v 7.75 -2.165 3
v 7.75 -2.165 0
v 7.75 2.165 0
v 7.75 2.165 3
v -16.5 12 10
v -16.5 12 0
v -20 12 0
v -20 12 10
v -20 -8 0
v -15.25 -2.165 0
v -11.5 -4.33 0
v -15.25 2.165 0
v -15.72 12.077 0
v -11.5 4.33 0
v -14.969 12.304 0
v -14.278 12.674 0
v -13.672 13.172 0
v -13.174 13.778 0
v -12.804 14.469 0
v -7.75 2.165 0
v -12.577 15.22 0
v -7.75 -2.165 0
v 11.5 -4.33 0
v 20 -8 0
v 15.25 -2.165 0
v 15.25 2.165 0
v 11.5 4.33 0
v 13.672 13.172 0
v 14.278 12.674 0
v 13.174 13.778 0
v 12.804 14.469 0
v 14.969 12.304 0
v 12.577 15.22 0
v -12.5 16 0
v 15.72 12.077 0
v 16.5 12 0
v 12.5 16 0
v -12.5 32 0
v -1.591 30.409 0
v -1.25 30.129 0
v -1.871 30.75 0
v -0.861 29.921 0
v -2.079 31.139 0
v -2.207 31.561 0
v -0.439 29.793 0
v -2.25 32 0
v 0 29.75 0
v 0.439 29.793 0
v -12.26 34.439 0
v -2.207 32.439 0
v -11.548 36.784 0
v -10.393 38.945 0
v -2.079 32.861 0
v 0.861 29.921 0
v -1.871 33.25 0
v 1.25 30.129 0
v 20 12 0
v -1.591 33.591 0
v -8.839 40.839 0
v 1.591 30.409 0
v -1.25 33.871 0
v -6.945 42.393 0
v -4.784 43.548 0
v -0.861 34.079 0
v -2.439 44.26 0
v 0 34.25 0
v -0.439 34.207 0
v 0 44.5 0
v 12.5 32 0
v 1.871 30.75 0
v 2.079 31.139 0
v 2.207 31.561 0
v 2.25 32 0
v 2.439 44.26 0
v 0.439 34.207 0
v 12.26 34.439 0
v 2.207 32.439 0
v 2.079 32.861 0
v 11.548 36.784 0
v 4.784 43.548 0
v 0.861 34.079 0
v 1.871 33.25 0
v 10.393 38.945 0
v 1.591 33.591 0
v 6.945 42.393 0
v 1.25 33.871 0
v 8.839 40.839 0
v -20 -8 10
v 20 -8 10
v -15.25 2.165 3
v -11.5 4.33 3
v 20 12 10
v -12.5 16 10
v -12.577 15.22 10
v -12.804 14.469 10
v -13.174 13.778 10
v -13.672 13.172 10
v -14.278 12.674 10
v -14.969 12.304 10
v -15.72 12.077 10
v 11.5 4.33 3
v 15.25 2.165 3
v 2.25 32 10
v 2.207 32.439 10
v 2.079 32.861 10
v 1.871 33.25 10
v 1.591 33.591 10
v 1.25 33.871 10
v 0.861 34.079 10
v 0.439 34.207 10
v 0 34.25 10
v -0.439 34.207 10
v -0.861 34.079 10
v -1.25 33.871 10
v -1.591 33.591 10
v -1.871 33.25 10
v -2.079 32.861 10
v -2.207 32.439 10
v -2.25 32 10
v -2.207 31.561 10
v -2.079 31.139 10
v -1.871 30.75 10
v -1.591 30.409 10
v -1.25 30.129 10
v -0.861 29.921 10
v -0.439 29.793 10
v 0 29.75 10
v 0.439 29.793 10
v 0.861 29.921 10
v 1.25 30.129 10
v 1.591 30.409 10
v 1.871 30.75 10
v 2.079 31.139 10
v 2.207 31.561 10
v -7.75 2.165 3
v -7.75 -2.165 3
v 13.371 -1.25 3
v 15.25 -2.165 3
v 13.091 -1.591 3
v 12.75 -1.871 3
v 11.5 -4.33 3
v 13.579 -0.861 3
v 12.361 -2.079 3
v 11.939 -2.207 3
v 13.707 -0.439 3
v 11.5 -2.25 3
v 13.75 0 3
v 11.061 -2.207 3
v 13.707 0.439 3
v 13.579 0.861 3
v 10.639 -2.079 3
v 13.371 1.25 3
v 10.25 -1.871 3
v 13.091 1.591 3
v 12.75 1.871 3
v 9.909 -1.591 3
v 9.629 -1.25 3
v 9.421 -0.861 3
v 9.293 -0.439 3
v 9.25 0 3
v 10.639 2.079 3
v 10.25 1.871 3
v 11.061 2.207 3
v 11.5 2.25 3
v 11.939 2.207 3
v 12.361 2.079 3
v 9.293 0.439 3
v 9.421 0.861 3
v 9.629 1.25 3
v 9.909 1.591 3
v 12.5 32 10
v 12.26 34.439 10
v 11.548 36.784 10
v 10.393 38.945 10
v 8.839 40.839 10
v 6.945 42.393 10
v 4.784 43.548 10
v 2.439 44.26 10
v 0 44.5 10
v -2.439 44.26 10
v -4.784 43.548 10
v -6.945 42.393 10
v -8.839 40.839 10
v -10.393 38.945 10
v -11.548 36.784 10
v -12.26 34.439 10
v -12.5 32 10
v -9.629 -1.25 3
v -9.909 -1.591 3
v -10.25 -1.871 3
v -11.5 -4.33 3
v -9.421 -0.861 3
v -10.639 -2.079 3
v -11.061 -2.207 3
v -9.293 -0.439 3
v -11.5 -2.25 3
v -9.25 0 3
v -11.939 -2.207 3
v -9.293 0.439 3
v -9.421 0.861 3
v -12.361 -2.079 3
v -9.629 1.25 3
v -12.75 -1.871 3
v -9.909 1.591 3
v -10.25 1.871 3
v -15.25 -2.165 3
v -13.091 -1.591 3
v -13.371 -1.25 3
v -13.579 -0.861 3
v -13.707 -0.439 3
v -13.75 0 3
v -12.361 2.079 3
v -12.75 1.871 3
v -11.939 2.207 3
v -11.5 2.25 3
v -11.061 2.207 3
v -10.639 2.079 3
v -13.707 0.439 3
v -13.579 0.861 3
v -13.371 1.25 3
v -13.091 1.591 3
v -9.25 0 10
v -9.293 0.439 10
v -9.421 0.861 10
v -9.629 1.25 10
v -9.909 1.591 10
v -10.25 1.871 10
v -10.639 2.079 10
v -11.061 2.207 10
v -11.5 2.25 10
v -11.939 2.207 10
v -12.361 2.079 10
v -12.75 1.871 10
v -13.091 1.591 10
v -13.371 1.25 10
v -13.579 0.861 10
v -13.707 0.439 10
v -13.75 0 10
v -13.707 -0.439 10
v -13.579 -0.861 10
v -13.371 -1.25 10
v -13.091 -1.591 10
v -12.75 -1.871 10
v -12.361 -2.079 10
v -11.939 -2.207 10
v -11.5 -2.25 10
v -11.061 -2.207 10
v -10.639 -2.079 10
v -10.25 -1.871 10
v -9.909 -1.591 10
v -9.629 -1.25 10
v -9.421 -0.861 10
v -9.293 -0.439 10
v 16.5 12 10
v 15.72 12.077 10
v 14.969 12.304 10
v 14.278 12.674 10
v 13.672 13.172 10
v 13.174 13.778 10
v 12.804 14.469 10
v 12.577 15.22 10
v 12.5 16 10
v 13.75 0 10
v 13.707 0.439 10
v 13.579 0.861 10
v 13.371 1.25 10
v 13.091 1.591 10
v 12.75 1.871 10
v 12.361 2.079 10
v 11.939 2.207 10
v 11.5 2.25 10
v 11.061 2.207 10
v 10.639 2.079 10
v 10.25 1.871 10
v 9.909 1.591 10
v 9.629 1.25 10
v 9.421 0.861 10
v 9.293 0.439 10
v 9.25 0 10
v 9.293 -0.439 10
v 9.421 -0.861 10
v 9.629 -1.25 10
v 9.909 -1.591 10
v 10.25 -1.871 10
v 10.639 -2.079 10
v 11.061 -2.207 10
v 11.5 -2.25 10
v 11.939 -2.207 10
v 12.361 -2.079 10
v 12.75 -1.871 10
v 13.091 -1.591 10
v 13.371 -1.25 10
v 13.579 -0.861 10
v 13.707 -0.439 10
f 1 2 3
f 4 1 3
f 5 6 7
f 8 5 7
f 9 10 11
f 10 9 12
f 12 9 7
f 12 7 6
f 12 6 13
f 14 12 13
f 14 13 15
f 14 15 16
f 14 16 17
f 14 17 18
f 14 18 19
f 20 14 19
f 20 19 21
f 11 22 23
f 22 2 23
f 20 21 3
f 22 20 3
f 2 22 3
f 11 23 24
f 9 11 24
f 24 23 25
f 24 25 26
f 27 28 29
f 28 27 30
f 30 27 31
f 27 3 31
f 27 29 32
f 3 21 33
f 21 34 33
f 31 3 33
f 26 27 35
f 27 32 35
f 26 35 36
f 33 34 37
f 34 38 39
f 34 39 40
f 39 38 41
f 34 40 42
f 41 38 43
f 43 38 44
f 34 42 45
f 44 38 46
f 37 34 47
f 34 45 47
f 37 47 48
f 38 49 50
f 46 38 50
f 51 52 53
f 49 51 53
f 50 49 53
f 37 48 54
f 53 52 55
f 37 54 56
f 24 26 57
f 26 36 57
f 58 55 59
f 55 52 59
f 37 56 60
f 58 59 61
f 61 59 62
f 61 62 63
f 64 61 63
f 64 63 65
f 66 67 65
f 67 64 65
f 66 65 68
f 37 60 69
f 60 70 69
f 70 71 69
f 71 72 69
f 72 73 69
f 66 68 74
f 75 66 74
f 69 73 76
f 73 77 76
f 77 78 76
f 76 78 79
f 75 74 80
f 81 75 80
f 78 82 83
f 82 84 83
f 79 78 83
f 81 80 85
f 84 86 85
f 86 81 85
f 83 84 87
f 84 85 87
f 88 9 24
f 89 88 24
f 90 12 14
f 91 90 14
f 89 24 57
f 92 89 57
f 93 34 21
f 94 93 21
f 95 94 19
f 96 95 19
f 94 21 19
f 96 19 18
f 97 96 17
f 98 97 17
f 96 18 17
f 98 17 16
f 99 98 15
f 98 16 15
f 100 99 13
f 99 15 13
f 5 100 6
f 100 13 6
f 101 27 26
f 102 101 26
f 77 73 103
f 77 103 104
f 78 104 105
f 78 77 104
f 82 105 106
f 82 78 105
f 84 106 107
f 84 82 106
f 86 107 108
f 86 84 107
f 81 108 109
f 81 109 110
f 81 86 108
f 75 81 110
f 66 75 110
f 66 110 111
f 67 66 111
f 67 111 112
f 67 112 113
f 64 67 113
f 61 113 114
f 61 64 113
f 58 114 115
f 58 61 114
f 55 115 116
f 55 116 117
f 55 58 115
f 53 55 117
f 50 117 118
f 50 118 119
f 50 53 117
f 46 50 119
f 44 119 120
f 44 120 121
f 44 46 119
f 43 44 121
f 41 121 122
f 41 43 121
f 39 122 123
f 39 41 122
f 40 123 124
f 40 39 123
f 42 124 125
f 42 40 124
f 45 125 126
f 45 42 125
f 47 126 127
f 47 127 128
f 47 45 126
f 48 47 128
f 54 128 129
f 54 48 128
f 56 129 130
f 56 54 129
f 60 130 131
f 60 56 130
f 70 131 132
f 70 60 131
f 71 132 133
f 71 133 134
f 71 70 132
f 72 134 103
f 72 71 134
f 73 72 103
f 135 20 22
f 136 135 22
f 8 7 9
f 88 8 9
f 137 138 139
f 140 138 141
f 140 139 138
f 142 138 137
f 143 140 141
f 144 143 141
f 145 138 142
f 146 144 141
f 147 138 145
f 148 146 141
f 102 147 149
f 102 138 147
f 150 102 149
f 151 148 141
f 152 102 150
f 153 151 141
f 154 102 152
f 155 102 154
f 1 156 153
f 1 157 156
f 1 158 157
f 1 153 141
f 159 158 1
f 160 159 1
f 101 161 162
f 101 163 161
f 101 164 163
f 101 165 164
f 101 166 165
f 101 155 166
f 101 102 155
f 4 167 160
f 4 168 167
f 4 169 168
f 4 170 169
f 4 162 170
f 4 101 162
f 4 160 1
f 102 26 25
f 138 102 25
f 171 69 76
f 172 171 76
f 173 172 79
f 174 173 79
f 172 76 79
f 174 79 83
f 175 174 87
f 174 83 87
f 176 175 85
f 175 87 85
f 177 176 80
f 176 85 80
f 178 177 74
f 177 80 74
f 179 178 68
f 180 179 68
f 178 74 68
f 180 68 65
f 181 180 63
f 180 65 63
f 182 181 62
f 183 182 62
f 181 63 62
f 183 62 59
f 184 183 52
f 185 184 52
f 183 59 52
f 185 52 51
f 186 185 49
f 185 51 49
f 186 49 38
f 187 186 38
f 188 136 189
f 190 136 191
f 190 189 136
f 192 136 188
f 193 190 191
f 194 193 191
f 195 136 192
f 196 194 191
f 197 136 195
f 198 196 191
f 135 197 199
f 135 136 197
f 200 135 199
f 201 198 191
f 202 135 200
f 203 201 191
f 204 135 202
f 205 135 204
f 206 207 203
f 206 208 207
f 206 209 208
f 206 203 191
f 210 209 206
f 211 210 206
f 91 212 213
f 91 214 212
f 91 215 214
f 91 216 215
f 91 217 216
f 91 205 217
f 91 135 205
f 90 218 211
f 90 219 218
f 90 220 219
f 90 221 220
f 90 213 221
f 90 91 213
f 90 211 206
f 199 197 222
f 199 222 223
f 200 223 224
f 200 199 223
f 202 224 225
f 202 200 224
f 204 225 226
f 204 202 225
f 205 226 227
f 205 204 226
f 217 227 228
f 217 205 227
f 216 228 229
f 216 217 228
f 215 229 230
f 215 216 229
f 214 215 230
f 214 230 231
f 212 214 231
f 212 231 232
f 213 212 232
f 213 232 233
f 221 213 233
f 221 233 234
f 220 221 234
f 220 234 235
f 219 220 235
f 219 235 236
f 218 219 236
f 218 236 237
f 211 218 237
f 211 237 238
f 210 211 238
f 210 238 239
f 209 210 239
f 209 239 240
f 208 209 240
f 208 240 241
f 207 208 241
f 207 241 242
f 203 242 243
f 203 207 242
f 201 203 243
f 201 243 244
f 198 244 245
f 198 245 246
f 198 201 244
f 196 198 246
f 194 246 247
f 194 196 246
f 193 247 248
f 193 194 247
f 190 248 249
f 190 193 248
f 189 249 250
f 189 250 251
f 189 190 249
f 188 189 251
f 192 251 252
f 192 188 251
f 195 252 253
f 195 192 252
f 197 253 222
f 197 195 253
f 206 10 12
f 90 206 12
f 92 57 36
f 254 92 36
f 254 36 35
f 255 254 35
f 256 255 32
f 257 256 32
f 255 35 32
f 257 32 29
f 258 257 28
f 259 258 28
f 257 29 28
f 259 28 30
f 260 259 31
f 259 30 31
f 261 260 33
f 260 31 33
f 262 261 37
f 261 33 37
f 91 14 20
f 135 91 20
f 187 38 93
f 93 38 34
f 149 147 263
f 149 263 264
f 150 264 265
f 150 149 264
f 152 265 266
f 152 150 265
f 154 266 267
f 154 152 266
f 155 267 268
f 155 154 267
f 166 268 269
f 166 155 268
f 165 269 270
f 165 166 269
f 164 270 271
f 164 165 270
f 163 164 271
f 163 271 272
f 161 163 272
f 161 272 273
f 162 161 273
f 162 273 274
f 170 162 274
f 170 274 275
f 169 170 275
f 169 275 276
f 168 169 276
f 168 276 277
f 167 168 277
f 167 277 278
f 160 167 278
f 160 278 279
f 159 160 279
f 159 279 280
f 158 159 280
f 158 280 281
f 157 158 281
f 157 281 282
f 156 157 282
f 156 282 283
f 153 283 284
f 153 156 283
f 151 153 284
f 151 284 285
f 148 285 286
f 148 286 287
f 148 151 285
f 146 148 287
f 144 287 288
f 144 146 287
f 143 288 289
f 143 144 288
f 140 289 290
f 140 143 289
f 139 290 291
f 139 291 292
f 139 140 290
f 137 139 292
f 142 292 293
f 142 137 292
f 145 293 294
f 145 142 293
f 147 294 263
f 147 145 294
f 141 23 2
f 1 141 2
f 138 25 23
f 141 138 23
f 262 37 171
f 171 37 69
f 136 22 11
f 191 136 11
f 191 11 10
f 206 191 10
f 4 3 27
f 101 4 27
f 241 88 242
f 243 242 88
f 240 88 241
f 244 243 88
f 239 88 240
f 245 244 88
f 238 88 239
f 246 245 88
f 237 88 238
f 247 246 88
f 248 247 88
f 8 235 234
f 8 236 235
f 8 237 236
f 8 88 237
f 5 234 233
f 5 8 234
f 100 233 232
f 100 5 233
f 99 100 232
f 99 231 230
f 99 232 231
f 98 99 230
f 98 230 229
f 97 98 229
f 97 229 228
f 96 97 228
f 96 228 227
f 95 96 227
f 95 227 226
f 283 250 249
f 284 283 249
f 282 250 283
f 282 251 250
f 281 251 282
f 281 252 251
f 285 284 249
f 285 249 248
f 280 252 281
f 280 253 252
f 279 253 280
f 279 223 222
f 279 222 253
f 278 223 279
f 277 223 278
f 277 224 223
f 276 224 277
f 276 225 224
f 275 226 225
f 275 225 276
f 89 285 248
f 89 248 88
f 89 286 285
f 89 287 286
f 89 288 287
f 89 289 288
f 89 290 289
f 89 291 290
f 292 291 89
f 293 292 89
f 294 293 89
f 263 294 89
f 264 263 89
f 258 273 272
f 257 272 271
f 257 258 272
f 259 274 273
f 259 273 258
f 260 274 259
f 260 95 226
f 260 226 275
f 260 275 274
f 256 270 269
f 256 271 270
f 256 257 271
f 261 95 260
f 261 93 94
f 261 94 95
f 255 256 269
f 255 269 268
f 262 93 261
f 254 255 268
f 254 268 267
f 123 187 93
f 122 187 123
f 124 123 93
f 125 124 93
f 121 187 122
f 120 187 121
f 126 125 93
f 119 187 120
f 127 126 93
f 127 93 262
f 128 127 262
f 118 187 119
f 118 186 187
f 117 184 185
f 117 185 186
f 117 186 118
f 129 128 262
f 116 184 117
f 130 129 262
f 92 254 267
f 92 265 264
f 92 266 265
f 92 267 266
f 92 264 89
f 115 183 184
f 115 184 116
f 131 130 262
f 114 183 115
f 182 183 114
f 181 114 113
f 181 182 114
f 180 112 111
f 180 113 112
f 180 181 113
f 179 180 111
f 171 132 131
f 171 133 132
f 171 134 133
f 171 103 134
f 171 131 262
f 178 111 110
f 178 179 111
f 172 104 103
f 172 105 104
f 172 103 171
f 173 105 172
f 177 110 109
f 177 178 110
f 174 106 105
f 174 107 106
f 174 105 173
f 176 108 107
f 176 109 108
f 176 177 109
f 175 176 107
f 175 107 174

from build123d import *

# Parameters (mm, degrees)
SKETCH_1_R          = 2.25
EXTRUDE_1_DEPTH     = 10
CUT_EXTRUDE_1_DEPTH = 3


with BuildPart() as part:
    # 草图1 → 凸台-拉伸1 (new body)
    with BuildSketch(Plane.XY):
        with BuildLine():
            Line((-20, 12), (-20, -8))
            Line((-20, -8), (20, -8))
            Line((20, -8), (20, 12))
            Line((20, 12), (16.5, 12))
            ThreePointArc((16.5, 12), (13.671572875, 13.171572875), (12.5, 16))
            Line((12.5, 16), (12.5, 32))
            ThreePointArc((12.5, 32), (0, 44.5), (-12.5, 32))
            Line((-12.5, 32), (-12.5, 16))
            ThreePointArc((-12.5, 16), (-13.671572875, 13.171572875), (-16.5, 12))
            Line((-16.5, 12), (-20, 12))
        make_face()
        with Locations((-11.5, 0)):
            Circle(SKETCH_1_R, mode=Mode.SUBTRACT)
        with Locations((11.5, 0)):
            Circle(SKETCH_1_R, mode=Mode.SUBTRACT)
        with Locations((0, 32)):
            Circle(SKETCH_1_R, mode=Mode.SUBTRACT)
    extrude(amount=EXTRUDE_1_DEPTH)

    # 草图2 → 切除-拉伸1 (cut)
    with BuildSketch(Plane(origin=(0, 0, 0), x_dir=(-1, 0, 0), z_dir=(0, 0, -1))):
        Polygon((-11.5, -4.330127019), (-7.75, -2.165063509), (-7.75, 2.165063509), (-11.5, 4.330127019), (-15.25, 2.165063509), (-15.25, -2.165063509), align=None)
        Polygon((11.5, -4.330127019), (15.25, -2.165063509), (15.25, 2.165063509), (11.5, 4.330127019), (7.75, 2.165063509), (7.75, -2.165063509), align=None)
    extrude(amount=-CUT_EXTRUDE_1_DEPTH, mode=Mode.SUBTRACT)


solid = part.part
